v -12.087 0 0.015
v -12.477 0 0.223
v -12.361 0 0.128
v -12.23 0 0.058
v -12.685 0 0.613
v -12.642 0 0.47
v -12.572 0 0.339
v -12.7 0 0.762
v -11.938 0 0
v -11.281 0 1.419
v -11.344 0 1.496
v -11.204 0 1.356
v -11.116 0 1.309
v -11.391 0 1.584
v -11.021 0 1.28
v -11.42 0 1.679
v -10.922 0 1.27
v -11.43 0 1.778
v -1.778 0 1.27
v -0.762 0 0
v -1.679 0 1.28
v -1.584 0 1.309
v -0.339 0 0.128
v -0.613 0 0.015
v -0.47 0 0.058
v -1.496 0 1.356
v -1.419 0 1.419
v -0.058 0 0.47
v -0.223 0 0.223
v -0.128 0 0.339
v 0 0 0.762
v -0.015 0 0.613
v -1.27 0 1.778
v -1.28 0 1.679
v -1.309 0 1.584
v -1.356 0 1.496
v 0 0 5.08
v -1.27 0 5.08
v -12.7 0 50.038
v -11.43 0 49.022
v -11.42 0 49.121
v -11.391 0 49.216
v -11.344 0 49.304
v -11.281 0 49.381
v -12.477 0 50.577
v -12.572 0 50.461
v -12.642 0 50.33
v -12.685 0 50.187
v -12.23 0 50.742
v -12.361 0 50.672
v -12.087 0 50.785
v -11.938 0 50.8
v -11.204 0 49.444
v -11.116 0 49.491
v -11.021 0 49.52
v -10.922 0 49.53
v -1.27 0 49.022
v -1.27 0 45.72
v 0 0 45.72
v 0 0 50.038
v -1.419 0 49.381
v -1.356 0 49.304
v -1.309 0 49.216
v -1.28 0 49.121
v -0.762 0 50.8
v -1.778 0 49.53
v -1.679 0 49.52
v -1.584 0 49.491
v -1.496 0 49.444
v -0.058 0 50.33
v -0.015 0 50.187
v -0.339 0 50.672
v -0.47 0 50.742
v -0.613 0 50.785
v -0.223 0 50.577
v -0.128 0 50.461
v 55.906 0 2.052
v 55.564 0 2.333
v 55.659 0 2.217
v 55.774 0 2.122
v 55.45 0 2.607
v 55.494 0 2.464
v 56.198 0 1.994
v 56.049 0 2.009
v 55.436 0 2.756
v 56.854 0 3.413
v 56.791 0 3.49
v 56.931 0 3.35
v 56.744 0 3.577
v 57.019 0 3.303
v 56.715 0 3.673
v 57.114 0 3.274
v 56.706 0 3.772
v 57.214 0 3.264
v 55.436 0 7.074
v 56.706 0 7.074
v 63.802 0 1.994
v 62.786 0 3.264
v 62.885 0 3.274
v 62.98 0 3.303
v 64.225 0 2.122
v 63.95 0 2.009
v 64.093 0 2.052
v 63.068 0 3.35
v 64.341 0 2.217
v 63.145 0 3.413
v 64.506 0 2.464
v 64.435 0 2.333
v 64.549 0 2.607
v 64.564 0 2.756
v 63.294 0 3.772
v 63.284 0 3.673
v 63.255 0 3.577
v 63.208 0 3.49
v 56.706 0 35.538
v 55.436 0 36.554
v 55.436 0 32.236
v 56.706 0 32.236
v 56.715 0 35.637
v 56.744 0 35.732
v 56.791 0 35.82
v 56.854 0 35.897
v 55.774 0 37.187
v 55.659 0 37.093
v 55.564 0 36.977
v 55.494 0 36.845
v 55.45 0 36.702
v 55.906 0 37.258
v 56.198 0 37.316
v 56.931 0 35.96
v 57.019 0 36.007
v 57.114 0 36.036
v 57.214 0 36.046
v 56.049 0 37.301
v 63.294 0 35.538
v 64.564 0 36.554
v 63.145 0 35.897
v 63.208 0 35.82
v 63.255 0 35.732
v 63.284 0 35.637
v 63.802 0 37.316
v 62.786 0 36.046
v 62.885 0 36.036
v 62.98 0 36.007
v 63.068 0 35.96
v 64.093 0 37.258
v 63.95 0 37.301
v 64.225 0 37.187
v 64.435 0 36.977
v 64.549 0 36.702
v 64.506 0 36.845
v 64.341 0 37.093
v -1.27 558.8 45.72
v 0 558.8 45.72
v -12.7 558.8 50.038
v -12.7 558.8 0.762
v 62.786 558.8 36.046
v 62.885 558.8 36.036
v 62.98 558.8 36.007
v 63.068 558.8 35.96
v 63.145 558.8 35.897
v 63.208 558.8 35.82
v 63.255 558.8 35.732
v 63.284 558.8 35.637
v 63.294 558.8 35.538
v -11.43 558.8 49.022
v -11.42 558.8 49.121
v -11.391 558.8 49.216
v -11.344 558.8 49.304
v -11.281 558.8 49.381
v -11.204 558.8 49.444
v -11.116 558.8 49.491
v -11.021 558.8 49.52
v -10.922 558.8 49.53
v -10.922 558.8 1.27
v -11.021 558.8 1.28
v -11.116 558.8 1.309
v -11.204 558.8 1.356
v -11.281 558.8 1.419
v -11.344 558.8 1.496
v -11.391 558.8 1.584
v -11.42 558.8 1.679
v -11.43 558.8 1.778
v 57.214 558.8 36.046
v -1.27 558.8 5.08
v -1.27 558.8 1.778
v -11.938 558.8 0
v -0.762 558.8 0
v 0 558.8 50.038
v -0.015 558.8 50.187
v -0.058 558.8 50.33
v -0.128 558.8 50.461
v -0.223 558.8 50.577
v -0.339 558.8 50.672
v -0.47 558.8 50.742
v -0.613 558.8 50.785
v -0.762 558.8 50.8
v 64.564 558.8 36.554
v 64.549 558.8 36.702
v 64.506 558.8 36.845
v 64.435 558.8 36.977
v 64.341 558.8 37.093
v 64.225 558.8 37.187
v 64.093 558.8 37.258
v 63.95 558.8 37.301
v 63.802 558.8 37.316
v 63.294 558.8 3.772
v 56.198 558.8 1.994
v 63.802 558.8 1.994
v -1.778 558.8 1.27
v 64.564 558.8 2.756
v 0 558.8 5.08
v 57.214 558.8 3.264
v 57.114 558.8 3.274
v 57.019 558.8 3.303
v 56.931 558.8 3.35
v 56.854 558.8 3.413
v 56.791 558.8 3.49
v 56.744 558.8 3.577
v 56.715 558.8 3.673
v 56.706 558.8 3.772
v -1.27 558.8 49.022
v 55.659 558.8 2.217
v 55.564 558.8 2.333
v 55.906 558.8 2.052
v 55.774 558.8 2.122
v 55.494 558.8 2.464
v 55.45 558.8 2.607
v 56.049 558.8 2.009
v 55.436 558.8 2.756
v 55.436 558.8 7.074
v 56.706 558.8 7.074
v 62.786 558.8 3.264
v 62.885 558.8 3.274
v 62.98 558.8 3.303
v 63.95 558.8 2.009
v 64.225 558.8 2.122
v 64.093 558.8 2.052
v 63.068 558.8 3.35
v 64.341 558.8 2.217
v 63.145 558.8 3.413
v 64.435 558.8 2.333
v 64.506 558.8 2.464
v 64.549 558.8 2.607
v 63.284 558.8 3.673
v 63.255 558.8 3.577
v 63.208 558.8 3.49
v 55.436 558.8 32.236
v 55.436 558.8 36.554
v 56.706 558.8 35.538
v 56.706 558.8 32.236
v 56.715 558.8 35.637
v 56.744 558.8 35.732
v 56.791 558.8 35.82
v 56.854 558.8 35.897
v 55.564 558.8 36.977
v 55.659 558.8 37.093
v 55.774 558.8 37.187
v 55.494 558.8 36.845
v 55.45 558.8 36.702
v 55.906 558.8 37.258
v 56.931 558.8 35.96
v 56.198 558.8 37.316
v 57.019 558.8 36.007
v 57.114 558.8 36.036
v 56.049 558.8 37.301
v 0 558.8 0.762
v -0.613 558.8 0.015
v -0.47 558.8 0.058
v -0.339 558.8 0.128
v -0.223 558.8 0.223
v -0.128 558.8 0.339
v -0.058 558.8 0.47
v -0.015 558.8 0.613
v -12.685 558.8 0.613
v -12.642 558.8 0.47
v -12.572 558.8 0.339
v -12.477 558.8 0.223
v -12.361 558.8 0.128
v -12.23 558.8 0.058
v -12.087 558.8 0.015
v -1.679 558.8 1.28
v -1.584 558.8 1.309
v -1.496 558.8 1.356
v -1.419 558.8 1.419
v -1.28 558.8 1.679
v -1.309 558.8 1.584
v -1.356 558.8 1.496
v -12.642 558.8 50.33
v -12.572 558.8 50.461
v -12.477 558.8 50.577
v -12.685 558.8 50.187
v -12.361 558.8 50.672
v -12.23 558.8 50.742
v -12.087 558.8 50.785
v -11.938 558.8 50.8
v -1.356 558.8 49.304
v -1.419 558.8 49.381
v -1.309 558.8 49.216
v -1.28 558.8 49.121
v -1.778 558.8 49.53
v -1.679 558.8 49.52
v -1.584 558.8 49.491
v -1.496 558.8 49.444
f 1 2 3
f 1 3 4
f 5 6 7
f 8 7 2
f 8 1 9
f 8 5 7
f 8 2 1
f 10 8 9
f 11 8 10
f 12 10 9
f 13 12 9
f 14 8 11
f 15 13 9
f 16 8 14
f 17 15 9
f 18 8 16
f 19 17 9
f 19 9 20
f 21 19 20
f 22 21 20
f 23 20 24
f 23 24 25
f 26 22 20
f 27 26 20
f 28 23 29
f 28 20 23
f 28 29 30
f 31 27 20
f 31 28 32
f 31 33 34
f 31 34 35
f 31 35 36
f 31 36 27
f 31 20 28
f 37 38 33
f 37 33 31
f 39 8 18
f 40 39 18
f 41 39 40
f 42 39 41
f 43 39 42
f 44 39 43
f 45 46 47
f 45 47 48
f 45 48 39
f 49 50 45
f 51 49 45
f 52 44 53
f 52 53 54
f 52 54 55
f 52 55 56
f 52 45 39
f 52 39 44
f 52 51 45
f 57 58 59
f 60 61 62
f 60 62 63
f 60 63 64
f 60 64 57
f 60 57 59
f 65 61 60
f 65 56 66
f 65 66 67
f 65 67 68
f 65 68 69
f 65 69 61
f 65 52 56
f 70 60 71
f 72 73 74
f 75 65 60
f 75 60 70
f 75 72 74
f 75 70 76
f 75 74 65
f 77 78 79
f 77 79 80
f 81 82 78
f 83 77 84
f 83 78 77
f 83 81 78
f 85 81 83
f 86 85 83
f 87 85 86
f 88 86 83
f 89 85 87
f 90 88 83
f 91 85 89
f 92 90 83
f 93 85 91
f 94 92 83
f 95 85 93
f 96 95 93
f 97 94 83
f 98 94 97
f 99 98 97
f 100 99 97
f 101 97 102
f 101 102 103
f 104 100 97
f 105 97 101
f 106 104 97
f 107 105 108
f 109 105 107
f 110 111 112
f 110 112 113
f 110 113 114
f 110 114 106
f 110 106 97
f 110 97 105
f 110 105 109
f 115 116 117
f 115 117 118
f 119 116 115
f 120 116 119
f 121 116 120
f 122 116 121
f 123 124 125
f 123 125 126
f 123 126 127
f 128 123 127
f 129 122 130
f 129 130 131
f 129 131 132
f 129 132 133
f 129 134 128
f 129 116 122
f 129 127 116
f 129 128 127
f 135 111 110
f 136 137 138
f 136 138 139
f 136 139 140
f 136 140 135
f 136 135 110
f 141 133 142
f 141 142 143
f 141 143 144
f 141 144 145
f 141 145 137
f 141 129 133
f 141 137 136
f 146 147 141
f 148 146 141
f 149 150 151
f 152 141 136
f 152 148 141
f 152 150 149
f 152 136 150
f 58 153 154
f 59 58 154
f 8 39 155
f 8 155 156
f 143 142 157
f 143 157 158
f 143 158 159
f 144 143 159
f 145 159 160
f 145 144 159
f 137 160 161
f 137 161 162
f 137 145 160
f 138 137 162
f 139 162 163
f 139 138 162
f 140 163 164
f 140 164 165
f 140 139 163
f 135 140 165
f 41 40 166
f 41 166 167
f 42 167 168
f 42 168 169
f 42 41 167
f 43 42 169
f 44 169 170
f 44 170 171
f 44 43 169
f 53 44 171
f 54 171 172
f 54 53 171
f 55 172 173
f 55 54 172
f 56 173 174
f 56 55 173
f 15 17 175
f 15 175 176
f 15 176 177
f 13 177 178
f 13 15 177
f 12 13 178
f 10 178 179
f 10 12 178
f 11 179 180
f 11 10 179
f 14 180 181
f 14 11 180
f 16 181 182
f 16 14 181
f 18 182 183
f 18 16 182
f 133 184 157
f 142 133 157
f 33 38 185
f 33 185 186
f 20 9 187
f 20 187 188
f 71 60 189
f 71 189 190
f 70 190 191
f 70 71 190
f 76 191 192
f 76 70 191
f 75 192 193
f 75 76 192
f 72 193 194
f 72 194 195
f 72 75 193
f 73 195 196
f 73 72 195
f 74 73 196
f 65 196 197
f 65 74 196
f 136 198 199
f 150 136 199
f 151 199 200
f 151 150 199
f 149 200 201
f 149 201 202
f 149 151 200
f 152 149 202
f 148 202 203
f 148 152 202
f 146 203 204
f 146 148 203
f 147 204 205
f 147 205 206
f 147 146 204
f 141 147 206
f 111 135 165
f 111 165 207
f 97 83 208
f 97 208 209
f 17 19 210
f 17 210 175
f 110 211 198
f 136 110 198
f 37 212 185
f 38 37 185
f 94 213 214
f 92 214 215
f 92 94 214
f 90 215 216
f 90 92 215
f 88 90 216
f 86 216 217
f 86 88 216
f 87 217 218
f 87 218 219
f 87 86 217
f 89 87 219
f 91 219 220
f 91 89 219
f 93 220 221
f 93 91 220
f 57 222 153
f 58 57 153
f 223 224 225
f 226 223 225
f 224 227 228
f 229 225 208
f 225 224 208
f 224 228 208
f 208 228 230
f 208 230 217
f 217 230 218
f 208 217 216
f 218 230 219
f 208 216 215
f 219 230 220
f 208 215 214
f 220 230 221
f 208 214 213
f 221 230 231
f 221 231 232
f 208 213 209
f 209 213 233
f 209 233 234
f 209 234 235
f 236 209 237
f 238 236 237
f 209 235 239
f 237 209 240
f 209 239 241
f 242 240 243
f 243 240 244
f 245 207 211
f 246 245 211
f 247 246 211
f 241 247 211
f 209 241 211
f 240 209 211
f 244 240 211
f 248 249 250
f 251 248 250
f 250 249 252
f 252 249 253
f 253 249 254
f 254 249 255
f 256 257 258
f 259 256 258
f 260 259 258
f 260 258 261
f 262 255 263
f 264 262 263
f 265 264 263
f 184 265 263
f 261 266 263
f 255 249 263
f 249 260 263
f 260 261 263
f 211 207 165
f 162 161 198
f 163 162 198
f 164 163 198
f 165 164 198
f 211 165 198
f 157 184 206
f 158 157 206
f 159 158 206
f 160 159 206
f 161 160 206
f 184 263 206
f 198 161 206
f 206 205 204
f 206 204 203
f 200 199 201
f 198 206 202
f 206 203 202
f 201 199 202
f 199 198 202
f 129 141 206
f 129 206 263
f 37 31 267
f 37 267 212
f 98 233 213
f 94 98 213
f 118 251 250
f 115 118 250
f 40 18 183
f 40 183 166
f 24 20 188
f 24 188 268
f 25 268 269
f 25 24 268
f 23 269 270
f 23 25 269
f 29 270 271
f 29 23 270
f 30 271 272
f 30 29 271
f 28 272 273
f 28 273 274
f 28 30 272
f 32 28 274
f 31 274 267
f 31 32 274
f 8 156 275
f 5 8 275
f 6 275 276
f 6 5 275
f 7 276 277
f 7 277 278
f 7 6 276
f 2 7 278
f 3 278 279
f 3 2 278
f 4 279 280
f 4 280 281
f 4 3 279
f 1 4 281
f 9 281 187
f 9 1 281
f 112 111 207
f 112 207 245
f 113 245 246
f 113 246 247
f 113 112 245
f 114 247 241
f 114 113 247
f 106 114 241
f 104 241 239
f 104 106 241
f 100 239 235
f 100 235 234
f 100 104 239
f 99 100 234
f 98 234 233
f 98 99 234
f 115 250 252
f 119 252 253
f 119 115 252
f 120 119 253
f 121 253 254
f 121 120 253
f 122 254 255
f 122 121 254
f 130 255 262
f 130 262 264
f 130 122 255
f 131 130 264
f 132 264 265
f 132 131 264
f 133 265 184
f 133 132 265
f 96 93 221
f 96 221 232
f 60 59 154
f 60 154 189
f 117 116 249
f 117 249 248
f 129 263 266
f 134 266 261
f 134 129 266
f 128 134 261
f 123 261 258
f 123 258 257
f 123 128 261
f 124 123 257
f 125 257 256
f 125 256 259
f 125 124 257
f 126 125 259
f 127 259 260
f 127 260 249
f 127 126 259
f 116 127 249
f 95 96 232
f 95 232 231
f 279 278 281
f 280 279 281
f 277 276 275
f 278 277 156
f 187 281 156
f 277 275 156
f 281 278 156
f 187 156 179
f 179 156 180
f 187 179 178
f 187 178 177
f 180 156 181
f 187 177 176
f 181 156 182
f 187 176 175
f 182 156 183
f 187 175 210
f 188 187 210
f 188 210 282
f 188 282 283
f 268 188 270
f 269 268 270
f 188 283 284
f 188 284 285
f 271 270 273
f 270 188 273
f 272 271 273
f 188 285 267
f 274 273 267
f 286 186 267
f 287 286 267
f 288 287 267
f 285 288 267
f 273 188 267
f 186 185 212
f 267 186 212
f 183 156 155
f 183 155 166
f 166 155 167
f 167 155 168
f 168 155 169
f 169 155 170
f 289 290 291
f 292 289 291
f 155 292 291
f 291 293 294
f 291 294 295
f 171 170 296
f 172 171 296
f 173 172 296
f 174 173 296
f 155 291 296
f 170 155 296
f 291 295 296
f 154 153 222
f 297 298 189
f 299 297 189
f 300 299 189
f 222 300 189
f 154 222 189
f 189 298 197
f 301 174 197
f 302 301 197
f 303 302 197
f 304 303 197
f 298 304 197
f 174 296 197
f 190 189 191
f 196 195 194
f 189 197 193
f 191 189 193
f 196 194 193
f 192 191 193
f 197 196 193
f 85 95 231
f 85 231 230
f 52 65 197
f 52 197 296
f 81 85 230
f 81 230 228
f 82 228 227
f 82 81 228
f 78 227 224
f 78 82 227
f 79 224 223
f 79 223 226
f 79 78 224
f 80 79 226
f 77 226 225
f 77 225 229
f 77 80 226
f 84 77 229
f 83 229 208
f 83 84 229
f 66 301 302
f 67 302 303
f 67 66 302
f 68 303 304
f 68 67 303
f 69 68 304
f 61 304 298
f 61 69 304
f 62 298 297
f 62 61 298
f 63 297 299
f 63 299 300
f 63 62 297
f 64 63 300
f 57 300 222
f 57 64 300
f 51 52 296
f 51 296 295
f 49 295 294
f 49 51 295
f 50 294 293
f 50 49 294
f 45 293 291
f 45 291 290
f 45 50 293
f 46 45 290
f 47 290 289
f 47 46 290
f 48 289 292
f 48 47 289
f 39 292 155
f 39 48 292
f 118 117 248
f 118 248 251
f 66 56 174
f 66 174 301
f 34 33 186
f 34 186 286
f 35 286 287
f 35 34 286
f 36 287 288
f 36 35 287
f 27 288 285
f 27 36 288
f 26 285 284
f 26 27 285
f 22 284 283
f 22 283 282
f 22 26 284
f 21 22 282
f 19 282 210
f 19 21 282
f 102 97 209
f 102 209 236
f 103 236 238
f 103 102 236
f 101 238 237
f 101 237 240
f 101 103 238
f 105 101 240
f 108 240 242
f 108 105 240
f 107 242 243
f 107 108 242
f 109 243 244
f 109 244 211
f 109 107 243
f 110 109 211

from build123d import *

# Parameters (mm, degrees)
F1_DEPTH = 558.8
F3_DEPTH = 558.8


with BuildPart() as f1:
    # F0 (on Front) → F1 (new body)
    with BuildSketch(Plane.XZ):
        with BuildLine():
            Line((-0.762, 50.8), (-11.938, 50.8))
            ThreePointArc((-11.938, 50.8), (-12.4768153673, 50.5768153673), (-12.7, 50.038))
            Line((-12.7, 50.038), (-12.7, 0.762))
            ThreePointArc((-12.7, 0.762), (-12.4768153673, 0.2231846327), (-11.938, 0))
            Line((-11.938, 0), (-0.762, 0))
            ThreePointArc((-0.762, 0), (-0.2231846327, 0.2231846327), (0, 0.762))
            Line((0, 0.762), (0, 5.08))
            Line((0, 5.08), (-1.27, 5.08))
            Line((-1.27, 5.08), (-1.27, 1.778))
            ThreePointArc((-1.27, 1.778), (-1.4187897552, 1.4187897552), (-1.778, 1.27))
            Line((-1.778, 1.27), (-10.922, 1.27))
            ThreePointArc((-10.922, 1.27), (-11.2812102448, 1.4187897552), (-11.43, 1.778))
            Line((-11.43, 1.778), (-11.43, 49.022))
            ThreePointArc((-11.43, 49.022), (-11.2812102448, 49.3812102448), (-10.922, 49.53))
            Line((-10.922, 49.53), (-1.778, 49.53))
            ThreePointArc((-1.778, 49.53), (-1.4187897552, 49.3812102448), (-1.27, 49.022))
            Line((-1.27, 49.022), (-1.27, 45.72))
            Line((-1.27, 45.72), (0, 45.72))
            Line((0, 45.72), (0, 50.038))
            ThreePointArc((0, 50.038), (-0.2231846327, 50.5768153673), (-0.762, 50.8))
        make_face()
    extrude(amount=-F1_DEPTH)


with BuildPart() as f3:
    # F2 (on Front) → F3 (new body, through all)
    with BuildSketch(Plane.XZ):
        with BuildLine():
            Line((55.4355934913, 36.5537767948), (55.4355934913, 32.2357767948))
            Line((55.4355934913, 32.2357767948), (56.7055934913, 32.2357767948))
            Line((56.7055934913, 32.2357767948), (56.7055934913, 35.5377767948))
            ThreePointArc((56.7055934913, 35.5377767948), (56.8543832465, 35.8969870396), (57.2135934913, 36.0457767948))
            Line((57.2135934913, 36.0457767948), (62.7857184913, 36.0457767948))
            ThreePointArc((62.7857184913, 36.0457767948), (63.1449287362, 35.8969870396), (63.2937184913, 35.5377767948))
            Line((63.2937184913, 35.5377767948), (63.2937184913, 3.7719017948))
            ThreePointArc((63.2937184913, 3.7719017948), (63.1449287362, 3.4126915499), (62.7857184913, 3.2639017948))
            Line((62.7857184913, 3.2639017948), (57.2135934913, 3.2639017948))
            ThreePointArc((57.2135934913, 3.2639017948), (56.8543832465, 3.4126915499), (56.7055934913, 3.7719017948))
            Line((56.7055934913, 3.7719017948), (56.7055934913, 7.0739017948))
            Line((56.7055934913, 7.0739017948), (55.4355934913, 7.0739017948))
            Line((55.4355934913, 7.0739017948), (55.4355934913, 2.7559017948))
            ThreePointArc((55.4355934913, 2.7559017948), (55.6587781241, 2.2170864275), (56.1975934913, 1.9939017948))
            Line((56.1975934913, 1.9939017948), (63.8017184913, 1.9939017948))
            ThreePointArc((63.8017184913, 1.9939017948), (64.3405338586, 2.2170864275), (64.5637184913, 2.7559017948))
            Line((64.5637184913, 2.7559017948), (64.5637184913, 36.5537767948))
            ThreePointArc((64.5637184913, 36.5537767948), (64.3405338586, 37.092592162), (63.8017184913, 37.3157767948))
            Line((63.8017184913, 37.3157767948), (56.1975934913, 37.3157767948))
            ThreePointArc((56.1975934913, 37.3157767948), (55.6587781241, 37.092592162), (55.4355934913, 36.5537767948))
        make_face()
    extrude(amount=-F3_DEPTH)


solid = Compound([f1.part, f3.part])
